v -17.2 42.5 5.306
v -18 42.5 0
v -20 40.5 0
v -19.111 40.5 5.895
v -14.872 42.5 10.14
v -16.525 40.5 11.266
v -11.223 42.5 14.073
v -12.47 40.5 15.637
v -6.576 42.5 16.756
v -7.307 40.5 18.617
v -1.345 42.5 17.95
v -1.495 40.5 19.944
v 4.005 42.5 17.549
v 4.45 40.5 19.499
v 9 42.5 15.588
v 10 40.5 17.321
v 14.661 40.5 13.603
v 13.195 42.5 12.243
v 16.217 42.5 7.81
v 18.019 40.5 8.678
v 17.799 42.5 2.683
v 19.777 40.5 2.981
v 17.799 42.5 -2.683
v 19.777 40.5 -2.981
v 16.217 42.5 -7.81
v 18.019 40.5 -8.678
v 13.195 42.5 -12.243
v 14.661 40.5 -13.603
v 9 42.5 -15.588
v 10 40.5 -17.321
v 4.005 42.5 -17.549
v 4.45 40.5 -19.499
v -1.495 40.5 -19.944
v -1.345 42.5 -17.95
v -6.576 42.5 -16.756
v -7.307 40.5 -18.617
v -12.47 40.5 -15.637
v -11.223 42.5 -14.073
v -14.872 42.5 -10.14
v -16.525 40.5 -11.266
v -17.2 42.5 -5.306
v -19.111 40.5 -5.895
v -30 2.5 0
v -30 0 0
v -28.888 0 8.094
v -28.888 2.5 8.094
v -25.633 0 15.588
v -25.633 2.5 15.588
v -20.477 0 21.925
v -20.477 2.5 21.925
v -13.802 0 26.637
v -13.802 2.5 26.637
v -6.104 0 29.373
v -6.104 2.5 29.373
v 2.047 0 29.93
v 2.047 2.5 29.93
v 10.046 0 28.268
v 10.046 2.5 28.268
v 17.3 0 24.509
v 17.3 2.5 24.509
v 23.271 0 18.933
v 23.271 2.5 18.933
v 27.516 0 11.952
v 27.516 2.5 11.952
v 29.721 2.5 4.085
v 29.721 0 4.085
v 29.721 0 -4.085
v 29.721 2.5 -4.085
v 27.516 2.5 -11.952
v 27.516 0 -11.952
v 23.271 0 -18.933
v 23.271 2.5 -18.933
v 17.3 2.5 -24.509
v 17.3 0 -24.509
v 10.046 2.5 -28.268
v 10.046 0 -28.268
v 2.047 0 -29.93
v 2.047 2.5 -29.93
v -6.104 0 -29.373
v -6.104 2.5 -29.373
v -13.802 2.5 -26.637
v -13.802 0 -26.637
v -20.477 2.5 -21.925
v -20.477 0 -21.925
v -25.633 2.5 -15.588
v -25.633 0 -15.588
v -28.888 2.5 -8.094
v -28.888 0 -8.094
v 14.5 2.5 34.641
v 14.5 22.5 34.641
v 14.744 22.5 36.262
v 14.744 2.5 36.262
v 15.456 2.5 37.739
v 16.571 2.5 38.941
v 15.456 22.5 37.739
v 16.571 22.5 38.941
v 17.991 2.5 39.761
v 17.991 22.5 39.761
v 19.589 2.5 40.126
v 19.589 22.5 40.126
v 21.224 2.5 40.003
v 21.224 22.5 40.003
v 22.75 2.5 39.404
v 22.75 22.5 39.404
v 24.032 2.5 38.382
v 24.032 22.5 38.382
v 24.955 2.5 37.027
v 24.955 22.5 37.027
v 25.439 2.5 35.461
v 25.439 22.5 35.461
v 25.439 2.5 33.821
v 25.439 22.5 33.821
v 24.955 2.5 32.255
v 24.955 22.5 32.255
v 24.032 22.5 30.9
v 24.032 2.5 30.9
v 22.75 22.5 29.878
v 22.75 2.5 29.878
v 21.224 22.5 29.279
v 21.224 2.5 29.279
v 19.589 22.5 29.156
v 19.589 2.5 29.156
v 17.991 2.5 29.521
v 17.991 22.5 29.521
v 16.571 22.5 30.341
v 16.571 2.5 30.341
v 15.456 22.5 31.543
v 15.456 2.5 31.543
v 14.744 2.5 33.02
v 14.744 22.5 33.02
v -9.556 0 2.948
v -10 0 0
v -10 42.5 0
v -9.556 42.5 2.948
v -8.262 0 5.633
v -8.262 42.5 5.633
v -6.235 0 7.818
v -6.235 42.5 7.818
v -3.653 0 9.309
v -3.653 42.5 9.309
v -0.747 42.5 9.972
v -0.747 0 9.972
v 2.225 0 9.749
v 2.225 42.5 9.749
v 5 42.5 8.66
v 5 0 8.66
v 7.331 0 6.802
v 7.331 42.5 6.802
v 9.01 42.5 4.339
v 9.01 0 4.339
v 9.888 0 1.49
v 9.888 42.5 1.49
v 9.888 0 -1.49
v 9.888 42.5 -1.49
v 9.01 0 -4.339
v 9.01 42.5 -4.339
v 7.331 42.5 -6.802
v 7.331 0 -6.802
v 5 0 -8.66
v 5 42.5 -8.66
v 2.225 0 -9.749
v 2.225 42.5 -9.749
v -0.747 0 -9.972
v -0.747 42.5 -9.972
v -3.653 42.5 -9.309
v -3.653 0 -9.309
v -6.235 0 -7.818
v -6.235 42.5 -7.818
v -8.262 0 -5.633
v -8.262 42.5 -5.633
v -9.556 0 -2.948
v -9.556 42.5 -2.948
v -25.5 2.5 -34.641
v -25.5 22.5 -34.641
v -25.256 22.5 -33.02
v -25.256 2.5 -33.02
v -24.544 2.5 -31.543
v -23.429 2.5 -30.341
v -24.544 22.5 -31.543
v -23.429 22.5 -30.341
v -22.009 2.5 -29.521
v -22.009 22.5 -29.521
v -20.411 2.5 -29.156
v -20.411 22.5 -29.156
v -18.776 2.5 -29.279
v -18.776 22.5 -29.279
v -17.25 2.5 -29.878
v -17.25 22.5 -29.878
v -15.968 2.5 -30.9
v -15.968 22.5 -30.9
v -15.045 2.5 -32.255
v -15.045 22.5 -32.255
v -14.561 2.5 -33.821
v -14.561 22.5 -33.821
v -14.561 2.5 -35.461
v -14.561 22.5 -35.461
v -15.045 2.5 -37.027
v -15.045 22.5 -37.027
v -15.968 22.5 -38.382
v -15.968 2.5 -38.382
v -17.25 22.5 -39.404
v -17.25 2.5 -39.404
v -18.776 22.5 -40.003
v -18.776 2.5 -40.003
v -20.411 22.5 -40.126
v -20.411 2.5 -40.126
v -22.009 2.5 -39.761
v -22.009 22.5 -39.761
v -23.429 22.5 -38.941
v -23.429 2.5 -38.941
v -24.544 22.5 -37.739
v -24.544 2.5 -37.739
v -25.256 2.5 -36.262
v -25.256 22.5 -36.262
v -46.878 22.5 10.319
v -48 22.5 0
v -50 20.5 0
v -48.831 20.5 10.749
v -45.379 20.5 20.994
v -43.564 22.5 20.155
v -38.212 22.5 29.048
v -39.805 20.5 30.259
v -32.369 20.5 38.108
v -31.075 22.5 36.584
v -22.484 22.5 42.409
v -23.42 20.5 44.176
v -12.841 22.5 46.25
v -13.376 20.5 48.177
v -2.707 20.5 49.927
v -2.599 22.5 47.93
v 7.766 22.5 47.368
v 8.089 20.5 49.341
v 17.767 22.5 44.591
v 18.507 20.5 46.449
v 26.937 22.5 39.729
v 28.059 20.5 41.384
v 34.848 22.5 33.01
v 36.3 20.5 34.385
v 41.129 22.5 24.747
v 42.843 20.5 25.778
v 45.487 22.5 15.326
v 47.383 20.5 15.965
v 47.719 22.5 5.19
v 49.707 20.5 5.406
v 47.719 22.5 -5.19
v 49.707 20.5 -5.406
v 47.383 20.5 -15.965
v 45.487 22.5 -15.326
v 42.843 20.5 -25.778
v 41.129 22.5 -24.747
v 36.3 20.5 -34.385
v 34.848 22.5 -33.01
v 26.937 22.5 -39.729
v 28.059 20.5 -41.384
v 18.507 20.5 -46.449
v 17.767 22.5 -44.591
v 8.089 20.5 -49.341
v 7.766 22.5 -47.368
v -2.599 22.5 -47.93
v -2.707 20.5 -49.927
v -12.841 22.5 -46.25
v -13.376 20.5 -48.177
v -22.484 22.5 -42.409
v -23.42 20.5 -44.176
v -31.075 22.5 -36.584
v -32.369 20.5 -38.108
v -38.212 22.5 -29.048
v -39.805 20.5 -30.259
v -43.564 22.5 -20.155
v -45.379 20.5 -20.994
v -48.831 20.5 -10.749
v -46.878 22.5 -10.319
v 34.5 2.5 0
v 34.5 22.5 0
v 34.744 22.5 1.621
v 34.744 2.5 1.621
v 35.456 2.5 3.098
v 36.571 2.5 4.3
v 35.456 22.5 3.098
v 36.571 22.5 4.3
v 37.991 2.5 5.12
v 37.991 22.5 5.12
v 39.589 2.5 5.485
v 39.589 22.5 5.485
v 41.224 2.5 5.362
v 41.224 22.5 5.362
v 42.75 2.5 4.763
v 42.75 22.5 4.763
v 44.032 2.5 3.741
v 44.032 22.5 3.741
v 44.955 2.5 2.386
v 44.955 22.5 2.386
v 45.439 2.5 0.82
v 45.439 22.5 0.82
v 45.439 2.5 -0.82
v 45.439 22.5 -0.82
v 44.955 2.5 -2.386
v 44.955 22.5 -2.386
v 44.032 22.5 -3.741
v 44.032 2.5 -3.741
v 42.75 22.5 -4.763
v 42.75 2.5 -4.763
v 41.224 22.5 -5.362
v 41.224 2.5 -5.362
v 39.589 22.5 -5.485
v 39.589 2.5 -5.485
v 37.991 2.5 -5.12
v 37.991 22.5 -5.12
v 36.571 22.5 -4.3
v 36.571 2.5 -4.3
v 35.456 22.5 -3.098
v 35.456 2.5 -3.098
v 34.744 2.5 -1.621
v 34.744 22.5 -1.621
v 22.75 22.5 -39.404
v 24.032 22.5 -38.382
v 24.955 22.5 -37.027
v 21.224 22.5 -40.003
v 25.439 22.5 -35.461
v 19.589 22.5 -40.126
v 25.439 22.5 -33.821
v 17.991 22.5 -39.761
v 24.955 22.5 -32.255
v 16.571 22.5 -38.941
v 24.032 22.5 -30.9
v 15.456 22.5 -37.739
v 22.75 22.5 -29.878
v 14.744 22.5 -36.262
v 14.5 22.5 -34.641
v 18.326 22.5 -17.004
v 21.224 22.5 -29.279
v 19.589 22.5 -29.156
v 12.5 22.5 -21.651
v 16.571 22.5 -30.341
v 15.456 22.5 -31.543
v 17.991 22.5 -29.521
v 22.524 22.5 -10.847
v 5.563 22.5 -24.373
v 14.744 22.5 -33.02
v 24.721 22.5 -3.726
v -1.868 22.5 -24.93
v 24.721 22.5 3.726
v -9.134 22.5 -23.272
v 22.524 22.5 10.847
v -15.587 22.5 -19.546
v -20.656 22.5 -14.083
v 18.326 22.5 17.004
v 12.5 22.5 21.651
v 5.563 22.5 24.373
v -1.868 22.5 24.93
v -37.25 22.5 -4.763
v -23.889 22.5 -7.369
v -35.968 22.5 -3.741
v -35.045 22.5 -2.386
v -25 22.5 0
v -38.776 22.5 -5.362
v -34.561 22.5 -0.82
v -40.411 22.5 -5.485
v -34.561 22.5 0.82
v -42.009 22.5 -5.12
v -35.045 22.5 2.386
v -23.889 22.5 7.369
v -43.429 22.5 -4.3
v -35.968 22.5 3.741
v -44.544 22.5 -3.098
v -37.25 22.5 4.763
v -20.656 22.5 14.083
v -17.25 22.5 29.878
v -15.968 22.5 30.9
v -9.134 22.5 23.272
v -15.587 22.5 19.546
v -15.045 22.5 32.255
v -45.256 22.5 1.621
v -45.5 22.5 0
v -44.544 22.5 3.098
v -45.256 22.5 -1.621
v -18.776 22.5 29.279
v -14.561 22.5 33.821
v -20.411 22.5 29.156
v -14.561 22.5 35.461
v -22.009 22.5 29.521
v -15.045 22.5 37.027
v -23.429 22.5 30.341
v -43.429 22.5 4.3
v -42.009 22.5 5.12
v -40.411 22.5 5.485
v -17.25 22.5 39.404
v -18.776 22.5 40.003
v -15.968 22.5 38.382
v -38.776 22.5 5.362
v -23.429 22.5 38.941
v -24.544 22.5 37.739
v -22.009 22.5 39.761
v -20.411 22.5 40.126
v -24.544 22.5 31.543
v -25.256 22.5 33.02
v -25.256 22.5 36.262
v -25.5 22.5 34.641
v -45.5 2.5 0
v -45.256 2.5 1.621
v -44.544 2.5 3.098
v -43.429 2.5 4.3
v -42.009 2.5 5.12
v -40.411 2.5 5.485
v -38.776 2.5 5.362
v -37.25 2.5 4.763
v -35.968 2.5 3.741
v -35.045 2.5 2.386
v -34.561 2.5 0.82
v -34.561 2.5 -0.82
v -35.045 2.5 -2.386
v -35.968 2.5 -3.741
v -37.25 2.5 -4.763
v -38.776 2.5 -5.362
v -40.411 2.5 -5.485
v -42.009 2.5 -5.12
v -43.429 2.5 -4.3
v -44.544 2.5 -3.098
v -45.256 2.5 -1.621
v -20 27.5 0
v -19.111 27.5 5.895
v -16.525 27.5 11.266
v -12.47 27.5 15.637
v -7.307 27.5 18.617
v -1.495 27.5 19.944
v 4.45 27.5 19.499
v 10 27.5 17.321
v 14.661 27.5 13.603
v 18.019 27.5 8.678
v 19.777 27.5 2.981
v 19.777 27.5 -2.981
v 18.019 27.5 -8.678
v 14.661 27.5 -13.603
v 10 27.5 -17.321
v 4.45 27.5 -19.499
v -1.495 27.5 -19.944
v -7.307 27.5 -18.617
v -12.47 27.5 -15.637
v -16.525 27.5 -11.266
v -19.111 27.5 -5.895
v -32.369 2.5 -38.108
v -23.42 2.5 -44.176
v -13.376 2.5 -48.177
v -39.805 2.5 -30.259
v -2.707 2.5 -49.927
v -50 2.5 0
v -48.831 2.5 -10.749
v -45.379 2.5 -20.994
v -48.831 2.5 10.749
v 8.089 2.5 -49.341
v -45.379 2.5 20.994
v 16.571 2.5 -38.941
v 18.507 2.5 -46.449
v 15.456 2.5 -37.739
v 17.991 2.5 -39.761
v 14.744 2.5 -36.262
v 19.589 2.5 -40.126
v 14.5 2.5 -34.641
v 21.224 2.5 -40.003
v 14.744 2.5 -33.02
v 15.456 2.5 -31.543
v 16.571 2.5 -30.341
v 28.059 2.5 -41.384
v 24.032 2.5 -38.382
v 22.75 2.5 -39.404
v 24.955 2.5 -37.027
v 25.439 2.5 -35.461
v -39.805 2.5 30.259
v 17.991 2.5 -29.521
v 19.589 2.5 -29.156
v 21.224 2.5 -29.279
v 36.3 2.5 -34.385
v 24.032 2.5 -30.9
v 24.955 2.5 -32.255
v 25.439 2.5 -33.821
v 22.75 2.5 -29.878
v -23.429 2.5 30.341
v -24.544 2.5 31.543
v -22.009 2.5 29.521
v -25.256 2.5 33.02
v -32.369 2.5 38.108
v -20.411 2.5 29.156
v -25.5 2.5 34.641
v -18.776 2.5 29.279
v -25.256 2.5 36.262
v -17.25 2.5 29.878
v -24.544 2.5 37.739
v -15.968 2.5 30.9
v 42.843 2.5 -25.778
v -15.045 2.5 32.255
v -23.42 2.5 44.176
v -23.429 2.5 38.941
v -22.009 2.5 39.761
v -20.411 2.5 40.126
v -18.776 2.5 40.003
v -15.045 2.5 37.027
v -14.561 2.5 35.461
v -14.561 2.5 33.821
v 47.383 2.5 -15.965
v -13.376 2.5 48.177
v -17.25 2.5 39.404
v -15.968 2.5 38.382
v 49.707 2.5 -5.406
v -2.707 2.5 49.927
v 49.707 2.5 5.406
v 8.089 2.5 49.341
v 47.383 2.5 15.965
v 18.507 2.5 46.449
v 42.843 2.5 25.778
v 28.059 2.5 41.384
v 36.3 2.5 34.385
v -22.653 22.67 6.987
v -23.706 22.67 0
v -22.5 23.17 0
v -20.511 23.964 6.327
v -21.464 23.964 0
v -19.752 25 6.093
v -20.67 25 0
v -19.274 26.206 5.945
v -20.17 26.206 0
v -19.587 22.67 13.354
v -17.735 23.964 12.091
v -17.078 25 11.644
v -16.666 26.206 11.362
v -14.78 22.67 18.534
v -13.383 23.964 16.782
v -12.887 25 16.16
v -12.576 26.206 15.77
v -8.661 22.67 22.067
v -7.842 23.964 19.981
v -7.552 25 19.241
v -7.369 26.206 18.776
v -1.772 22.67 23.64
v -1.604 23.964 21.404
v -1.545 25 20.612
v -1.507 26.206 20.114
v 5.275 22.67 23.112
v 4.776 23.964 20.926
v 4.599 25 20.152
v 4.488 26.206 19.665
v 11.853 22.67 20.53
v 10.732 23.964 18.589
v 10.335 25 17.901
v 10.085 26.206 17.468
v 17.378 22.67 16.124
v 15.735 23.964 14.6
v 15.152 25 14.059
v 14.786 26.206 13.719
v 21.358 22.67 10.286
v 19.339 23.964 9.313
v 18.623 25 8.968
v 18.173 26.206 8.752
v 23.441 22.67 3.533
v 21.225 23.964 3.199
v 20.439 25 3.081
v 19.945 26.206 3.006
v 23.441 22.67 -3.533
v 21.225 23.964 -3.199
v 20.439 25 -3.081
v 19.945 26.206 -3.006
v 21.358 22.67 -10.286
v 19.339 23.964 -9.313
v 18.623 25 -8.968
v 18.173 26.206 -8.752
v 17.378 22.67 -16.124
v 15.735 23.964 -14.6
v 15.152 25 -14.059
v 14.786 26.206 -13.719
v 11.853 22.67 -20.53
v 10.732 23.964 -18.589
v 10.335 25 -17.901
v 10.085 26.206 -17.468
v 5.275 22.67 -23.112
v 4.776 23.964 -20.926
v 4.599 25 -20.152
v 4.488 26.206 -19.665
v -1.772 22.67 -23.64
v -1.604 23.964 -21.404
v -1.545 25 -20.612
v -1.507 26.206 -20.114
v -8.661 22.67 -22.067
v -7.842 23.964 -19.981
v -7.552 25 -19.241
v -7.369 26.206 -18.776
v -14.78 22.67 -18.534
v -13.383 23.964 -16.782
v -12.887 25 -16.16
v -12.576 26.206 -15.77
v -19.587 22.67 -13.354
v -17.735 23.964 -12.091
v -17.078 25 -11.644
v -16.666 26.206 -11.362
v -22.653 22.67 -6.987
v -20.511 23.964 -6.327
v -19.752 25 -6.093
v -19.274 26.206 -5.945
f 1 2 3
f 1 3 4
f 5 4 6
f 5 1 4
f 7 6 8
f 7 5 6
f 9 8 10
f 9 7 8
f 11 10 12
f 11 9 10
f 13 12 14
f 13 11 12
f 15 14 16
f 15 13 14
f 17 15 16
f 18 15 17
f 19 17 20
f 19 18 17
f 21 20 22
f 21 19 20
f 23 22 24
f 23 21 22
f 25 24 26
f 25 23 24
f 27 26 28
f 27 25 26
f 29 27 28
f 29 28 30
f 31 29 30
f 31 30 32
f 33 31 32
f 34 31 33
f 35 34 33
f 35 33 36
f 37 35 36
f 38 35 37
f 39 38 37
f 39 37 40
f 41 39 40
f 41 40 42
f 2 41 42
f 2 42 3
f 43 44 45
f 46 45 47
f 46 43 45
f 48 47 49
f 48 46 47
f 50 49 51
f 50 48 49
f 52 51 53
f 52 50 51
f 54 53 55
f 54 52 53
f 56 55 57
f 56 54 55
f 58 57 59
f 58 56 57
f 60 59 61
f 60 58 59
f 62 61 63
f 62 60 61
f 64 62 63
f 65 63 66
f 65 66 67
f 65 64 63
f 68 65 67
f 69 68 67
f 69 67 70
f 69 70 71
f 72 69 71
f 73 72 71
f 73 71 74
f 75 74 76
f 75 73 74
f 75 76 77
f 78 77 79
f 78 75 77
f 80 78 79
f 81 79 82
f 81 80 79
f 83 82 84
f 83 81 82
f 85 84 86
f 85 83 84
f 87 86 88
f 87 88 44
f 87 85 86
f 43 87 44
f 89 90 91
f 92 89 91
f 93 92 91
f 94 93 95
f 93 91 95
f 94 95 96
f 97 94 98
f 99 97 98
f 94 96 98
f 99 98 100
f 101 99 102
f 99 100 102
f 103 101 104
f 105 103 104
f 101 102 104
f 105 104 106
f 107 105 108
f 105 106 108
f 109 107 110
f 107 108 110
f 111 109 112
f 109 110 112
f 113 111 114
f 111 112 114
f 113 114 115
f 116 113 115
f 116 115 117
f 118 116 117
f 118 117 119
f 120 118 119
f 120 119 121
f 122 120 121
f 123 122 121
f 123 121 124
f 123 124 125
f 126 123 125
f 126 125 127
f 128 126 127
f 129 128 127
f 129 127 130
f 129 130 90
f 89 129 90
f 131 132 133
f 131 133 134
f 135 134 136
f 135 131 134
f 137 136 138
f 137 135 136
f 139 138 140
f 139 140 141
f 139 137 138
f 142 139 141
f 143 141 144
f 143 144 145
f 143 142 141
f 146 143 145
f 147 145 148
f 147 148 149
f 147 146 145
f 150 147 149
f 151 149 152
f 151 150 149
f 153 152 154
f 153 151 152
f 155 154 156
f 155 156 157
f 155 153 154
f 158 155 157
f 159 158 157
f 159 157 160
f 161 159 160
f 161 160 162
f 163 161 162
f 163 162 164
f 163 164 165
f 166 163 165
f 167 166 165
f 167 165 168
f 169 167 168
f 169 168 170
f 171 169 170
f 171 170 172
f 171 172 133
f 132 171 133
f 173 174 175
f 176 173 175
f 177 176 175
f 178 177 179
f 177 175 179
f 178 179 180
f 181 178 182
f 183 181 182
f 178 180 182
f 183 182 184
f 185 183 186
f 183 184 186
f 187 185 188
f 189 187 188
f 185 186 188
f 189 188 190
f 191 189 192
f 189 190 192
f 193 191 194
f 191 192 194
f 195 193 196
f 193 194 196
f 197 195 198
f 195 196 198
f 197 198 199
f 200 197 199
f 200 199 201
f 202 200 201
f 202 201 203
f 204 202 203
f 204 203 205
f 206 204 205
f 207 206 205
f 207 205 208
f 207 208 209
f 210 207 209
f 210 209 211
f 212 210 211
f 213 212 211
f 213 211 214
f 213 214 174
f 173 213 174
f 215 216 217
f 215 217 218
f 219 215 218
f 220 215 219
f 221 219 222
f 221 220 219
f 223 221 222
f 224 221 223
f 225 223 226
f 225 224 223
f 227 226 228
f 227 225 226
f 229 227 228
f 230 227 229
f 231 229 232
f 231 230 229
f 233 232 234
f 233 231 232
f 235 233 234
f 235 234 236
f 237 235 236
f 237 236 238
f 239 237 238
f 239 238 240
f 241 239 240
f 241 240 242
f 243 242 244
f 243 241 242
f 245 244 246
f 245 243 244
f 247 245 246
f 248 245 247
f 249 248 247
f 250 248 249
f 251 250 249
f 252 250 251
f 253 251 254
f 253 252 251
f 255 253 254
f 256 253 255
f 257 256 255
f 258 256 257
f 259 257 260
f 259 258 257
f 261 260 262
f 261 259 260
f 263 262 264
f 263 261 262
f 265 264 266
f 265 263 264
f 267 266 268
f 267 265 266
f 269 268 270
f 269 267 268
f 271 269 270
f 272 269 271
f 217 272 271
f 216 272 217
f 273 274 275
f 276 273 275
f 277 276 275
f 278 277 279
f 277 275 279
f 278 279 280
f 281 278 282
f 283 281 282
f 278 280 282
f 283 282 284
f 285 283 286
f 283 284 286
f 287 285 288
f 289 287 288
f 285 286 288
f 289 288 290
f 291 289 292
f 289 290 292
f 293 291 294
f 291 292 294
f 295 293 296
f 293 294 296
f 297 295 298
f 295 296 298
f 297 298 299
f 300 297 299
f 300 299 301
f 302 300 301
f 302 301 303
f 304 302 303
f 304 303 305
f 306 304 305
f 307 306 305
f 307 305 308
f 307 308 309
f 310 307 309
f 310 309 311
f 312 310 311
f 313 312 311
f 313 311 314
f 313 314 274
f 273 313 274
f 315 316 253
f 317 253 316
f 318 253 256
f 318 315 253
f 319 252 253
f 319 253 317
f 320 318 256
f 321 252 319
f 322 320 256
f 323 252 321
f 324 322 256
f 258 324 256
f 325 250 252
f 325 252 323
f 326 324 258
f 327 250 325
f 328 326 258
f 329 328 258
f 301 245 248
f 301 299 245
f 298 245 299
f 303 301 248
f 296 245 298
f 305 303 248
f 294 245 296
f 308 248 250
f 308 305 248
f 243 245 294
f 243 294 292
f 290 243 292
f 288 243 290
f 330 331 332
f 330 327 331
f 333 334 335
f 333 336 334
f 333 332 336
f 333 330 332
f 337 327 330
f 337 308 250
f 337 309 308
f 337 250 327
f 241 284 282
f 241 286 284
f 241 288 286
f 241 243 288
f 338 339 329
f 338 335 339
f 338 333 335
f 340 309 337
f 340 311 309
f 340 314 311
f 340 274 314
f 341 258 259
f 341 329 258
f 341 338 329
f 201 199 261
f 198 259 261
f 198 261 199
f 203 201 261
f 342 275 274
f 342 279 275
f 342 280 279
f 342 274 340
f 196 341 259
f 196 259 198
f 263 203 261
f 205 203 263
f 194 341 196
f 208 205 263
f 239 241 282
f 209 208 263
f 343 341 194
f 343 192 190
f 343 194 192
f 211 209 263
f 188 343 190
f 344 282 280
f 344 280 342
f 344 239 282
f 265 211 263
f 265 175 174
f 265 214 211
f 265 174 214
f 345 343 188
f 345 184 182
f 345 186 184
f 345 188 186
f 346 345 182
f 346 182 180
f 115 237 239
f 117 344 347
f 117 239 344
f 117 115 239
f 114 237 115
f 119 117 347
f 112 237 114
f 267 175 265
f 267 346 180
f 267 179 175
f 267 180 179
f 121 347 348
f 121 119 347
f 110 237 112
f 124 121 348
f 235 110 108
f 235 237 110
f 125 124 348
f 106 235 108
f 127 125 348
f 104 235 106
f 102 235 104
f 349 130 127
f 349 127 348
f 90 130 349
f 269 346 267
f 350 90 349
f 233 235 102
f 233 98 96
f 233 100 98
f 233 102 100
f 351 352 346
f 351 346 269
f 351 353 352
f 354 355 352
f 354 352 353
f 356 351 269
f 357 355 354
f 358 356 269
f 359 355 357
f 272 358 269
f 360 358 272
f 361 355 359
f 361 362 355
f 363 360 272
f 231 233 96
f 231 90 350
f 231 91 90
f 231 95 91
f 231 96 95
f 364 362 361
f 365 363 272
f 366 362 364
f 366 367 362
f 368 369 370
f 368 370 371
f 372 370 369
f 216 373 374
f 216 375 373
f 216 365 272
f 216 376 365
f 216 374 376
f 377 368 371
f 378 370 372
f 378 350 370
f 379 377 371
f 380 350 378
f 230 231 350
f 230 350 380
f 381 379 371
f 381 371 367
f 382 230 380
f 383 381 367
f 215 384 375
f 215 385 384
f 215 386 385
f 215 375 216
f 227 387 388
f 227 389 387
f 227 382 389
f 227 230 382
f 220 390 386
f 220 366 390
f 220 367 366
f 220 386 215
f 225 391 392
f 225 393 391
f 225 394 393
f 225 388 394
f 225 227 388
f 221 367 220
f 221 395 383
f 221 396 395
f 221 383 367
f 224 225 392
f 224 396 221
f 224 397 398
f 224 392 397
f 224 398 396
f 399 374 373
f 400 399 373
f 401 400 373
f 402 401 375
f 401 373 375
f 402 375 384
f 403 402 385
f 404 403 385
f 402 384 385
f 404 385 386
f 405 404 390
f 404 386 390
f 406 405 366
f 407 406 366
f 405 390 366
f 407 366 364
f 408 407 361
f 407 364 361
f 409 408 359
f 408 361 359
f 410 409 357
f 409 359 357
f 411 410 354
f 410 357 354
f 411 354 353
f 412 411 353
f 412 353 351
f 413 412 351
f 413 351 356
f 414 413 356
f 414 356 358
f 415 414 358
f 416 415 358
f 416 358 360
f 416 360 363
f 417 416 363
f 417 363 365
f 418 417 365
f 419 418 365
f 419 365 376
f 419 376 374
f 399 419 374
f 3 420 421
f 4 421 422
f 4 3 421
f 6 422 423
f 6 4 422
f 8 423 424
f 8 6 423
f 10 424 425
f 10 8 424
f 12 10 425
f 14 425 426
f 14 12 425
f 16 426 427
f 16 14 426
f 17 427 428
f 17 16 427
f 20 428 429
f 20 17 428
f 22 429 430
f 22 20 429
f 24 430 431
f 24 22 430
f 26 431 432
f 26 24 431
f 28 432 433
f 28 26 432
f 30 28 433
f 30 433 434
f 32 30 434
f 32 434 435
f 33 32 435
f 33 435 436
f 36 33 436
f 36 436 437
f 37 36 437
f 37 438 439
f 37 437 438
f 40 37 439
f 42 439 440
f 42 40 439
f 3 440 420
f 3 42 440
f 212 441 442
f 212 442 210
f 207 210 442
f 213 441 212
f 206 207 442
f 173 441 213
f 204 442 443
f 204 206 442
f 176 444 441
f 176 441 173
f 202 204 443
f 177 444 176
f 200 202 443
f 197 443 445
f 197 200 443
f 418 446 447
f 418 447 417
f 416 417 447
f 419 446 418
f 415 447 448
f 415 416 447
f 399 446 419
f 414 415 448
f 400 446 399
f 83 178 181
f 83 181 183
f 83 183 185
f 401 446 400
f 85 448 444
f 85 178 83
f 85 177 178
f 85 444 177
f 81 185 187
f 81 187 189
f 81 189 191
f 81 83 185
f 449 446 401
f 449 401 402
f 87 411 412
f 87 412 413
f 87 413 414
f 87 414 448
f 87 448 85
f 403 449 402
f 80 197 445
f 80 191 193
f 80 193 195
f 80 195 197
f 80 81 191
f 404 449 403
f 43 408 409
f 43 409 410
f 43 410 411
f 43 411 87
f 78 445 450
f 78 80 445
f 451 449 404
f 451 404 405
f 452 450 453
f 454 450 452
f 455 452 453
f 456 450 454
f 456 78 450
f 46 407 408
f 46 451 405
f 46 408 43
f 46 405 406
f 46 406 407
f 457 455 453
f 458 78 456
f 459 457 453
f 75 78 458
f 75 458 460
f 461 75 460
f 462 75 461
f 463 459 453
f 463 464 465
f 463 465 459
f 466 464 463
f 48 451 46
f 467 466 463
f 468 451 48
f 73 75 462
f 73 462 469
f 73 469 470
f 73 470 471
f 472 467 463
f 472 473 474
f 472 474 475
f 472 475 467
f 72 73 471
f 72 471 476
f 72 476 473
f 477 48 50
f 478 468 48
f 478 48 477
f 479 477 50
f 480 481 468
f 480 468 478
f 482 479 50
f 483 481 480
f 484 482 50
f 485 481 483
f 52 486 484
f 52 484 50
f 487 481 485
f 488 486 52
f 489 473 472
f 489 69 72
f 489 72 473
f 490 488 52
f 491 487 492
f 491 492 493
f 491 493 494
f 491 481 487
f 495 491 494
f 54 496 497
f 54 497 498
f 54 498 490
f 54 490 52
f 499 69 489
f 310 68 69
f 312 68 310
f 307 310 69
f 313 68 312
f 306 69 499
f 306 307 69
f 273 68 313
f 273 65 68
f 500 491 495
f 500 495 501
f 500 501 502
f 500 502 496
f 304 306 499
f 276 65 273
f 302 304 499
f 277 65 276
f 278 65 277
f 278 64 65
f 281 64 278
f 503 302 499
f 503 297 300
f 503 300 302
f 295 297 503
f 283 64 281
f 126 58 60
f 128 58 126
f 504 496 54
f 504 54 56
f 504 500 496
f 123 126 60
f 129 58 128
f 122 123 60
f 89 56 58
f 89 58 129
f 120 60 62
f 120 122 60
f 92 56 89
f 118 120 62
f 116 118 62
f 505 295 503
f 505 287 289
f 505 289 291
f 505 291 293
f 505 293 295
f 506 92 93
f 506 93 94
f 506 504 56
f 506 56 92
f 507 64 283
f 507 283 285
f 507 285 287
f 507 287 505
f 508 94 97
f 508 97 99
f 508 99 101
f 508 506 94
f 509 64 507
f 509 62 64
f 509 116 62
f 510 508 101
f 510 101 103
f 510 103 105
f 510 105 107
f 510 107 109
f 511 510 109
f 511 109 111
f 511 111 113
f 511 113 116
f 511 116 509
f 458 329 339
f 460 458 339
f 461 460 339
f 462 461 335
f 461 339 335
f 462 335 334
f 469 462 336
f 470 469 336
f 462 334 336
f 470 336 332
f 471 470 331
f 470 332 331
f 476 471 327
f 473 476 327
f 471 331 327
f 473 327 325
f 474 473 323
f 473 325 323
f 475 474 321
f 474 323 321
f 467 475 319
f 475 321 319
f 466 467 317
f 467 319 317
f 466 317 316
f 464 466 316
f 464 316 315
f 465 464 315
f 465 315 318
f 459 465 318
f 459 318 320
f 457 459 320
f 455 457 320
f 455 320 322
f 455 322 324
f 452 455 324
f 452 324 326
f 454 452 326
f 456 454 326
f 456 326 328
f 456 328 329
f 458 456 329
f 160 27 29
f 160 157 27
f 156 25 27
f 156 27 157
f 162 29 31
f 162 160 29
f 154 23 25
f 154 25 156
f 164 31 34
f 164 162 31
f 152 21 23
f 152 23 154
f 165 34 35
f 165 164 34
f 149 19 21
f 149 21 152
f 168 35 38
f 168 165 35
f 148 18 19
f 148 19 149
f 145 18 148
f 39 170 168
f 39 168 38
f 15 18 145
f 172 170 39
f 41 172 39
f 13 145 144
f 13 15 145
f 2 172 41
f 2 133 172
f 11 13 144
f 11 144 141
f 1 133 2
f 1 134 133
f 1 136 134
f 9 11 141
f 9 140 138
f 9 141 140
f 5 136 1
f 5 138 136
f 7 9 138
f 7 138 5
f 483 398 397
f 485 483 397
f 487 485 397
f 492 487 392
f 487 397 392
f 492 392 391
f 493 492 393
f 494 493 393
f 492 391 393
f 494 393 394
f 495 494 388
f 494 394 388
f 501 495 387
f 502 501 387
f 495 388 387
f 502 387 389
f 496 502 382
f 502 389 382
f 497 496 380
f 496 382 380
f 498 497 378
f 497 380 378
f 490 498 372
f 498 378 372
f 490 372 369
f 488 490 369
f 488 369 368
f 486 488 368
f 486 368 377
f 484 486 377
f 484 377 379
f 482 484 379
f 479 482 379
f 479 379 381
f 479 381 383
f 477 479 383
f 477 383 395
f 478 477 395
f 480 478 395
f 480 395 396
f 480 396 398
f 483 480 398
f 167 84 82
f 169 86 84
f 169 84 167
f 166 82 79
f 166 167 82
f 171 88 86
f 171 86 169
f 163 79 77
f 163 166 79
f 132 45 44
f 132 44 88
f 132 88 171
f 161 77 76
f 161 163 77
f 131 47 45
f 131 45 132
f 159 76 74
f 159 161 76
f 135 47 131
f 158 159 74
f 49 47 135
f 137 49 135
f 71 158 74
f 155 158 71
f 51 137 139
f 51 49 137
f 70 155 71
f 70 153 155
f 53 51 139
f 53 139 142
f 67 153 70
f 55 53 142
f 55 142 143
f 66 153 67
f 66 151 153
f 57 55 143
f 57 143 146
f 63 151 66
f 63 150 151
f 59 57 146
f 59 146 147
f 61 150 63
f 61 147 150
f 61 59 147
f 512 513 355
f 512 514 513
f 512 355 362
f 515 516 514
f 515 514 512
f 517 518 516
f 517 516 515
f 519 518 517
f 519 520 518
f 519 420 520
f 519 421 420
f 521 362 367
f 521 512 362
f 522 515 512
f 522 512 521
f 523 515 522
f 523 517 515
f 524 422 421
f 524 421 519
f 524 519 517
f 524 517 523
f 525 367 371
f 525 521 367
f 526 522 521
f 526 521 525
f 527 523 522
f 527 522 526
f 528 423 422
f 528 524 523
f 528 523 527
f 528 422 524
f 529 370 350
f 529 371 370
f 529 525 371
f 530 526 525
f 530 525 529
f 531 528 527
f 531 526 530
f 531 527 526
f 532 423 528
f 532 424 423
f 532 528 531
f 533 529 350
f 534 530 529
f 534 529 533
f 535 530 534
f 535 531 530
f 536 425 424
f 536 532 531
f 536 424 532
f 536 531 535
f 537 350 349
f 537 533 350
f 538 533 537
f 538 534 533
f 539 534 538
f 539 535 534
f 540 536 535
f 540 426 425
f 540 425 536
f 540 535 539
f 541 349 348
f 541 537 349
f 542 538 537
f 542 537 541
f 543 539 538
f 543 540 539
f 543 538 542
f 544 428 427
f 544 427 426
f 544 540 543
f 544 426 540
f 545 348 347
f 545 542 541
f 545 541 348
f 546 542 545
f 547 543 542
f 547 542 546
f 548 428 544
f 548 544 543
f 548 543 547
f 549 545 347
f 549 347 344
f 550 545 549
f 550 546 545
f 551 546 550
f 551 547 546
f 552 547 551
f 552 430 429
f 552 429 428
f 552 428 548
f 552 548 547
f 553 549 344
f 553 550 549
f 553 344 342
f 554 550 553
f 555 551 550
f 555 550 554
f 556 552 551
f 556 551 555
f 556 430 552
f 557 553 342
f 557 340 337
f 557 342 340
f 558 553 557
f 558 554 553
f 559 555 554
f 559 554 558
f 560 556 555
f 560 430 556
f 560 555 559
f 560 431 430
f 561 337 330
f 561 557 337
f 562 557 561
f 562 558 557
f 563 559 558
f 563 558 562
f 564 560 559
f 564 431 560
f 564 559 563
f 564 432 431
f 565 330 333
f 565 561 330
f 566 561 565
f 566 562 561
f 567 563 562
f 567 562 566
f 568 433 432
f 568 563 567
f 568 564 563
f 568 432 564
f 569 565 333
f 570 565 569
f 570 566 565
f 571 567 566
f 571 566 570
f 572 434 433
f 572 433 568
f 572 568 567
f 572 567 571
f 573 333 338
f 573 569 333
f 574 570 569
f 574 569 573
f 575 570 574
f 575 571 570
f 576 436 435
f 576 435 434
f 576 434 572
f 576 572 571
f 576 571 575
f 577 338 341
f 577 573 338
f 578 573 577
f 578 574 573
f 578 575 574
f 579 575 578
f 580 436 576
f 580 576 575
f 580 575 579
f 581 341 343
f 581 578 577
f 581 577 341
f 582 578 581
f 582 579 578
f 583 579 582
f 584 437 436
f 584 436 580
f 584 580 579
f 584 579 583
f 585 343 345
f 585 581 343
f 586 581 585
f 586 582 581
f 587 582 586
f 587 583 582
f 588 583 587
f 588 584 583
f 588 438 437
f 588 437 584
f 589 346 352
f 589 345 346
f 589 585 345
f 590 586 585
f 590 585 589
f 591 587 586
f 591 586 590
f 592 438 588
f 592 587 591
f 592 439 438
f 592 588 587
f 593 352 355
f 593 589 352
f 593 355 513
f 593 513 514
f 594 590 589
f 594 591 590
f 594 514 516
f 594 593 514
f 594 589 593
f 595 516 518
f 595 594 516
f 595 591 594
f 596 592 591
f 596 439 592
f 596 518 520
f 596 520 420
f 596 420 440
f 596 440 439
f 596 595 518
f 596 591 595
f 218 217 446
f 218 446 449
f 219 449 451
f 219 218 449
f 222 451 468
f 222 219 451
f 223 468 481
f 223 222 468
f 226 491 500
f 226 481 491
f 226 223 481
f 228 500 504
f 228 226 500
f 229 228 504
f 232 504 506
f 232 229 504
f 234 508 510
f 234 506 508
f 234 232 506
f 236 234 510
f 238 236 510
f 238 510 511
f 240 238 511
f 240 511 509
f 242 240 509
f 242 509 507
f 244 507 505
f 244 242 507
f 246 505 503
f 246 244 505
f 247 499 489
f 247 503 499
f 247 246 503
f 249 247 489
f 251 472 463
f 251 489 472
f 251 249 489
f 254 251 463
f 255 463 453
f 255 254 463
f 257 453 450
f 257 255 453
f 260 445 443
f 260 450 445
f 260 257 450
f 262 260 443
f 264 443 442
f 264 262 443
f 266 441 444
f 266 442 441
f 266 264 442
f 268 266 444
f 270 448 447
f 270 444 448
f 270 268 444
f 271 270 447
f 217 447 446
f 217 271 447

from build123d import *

# Parameters (mm, degrees)
SKETCH_2_R          = 5.5
CUT_EXTRUDE_1_DEPTH = 75.204110398


with BuildPart() as part:
    # 草图1 → 旋转1 (revolve)
    with BuildSketch(Plane.XY, mode=Mode.PRIVATE) as revolve_1_sk:
        with BuildLine():
            ThreePointArc((-25, 22.5), (-21.464466094, 23.964466094), (-20, 27.5))
            Line((-20, 27.5), (-20, 40.5))
            Line((-20, 40.5), (-18, 42.5))
            Line((-18, 42.5), (-10, 42.5))
            Line((-10, 42.5), (-10, 0))
            Line((-10, 0), (-30, 0))
            Line((-30, 0), (-30, 2.5))
            Line((-30, 2.5), (-50, 2.5))
            Line((-50, 2.5), (-50, 20.5))
            Line((-50, 20.5), (-48, 22.5))
            Line((-48, 22.5), (-25, 22.5))
        make_face()
        with BuildLine():
            Line((30, 0), (30, 2.5))
            Line((30, 2.5), (50, 2.5))
            Line((50, 2.5), (50, 20.5))
            Line((50, 20.5), (48, 22.5))
            Line((48, 22.5), (25, 22.5))
            ThreePointArc((25, 22.5), (21.464466094, 23.964466094), (20, 27.5))
            Line((20, 27.5), (20, 40.5))
            Line((20, 40.5), (18, 42.5))
            Line((18, 42.5), (10, 42.5))
            Line((10, 42.5), (10, 0))
            Line((10, 0), (30, 0))
        make_face()
    revolve(revolve_1_sk.sketch.rotate(Axis((0, -641.580774088, 0), (0, 1, 0)), 180), axis=Axis((0, -641.580774088, 0), (0, 1, 0)))

    # 草图2 → 切除-拉伸1 (cut, through all)
    with BuildSketch(Plane(origin=(0, 22.5, 0), x_dir=(1, 0, 0), z_dir=(0, 1, 0))):
        with Locations(Location((-40, 0, 0), (0, 0, 180))):
            Circle(SKETCH_2_R)
        with Locations(Location((-20, 34.641016151, 0), (0, 0, 180))):
            Circle(SKETCH_2_R)
        with Locations(Location((20, 34.641016151, 0), (0, 0, 180))):
            Circle(SKETCH_2_R)
        with Locations(Location((40, 0, 0), (0, 0, 180))):
            Circle(SKETCH_2_R)
        with Locations(Location((20, -34.641016151, 0), (0, 0, 180))):
            Circle(SKETCH_2_R)
        with Locations(Location((-20, -34.641016151, 0), (0, 0, 180))):
            Circle(SKETCH_2_R)
    extrude(amount=-CUT_EXTRUDE_1_DEPTH, mode=Mode.SUBTRACT)


solid = part.part
